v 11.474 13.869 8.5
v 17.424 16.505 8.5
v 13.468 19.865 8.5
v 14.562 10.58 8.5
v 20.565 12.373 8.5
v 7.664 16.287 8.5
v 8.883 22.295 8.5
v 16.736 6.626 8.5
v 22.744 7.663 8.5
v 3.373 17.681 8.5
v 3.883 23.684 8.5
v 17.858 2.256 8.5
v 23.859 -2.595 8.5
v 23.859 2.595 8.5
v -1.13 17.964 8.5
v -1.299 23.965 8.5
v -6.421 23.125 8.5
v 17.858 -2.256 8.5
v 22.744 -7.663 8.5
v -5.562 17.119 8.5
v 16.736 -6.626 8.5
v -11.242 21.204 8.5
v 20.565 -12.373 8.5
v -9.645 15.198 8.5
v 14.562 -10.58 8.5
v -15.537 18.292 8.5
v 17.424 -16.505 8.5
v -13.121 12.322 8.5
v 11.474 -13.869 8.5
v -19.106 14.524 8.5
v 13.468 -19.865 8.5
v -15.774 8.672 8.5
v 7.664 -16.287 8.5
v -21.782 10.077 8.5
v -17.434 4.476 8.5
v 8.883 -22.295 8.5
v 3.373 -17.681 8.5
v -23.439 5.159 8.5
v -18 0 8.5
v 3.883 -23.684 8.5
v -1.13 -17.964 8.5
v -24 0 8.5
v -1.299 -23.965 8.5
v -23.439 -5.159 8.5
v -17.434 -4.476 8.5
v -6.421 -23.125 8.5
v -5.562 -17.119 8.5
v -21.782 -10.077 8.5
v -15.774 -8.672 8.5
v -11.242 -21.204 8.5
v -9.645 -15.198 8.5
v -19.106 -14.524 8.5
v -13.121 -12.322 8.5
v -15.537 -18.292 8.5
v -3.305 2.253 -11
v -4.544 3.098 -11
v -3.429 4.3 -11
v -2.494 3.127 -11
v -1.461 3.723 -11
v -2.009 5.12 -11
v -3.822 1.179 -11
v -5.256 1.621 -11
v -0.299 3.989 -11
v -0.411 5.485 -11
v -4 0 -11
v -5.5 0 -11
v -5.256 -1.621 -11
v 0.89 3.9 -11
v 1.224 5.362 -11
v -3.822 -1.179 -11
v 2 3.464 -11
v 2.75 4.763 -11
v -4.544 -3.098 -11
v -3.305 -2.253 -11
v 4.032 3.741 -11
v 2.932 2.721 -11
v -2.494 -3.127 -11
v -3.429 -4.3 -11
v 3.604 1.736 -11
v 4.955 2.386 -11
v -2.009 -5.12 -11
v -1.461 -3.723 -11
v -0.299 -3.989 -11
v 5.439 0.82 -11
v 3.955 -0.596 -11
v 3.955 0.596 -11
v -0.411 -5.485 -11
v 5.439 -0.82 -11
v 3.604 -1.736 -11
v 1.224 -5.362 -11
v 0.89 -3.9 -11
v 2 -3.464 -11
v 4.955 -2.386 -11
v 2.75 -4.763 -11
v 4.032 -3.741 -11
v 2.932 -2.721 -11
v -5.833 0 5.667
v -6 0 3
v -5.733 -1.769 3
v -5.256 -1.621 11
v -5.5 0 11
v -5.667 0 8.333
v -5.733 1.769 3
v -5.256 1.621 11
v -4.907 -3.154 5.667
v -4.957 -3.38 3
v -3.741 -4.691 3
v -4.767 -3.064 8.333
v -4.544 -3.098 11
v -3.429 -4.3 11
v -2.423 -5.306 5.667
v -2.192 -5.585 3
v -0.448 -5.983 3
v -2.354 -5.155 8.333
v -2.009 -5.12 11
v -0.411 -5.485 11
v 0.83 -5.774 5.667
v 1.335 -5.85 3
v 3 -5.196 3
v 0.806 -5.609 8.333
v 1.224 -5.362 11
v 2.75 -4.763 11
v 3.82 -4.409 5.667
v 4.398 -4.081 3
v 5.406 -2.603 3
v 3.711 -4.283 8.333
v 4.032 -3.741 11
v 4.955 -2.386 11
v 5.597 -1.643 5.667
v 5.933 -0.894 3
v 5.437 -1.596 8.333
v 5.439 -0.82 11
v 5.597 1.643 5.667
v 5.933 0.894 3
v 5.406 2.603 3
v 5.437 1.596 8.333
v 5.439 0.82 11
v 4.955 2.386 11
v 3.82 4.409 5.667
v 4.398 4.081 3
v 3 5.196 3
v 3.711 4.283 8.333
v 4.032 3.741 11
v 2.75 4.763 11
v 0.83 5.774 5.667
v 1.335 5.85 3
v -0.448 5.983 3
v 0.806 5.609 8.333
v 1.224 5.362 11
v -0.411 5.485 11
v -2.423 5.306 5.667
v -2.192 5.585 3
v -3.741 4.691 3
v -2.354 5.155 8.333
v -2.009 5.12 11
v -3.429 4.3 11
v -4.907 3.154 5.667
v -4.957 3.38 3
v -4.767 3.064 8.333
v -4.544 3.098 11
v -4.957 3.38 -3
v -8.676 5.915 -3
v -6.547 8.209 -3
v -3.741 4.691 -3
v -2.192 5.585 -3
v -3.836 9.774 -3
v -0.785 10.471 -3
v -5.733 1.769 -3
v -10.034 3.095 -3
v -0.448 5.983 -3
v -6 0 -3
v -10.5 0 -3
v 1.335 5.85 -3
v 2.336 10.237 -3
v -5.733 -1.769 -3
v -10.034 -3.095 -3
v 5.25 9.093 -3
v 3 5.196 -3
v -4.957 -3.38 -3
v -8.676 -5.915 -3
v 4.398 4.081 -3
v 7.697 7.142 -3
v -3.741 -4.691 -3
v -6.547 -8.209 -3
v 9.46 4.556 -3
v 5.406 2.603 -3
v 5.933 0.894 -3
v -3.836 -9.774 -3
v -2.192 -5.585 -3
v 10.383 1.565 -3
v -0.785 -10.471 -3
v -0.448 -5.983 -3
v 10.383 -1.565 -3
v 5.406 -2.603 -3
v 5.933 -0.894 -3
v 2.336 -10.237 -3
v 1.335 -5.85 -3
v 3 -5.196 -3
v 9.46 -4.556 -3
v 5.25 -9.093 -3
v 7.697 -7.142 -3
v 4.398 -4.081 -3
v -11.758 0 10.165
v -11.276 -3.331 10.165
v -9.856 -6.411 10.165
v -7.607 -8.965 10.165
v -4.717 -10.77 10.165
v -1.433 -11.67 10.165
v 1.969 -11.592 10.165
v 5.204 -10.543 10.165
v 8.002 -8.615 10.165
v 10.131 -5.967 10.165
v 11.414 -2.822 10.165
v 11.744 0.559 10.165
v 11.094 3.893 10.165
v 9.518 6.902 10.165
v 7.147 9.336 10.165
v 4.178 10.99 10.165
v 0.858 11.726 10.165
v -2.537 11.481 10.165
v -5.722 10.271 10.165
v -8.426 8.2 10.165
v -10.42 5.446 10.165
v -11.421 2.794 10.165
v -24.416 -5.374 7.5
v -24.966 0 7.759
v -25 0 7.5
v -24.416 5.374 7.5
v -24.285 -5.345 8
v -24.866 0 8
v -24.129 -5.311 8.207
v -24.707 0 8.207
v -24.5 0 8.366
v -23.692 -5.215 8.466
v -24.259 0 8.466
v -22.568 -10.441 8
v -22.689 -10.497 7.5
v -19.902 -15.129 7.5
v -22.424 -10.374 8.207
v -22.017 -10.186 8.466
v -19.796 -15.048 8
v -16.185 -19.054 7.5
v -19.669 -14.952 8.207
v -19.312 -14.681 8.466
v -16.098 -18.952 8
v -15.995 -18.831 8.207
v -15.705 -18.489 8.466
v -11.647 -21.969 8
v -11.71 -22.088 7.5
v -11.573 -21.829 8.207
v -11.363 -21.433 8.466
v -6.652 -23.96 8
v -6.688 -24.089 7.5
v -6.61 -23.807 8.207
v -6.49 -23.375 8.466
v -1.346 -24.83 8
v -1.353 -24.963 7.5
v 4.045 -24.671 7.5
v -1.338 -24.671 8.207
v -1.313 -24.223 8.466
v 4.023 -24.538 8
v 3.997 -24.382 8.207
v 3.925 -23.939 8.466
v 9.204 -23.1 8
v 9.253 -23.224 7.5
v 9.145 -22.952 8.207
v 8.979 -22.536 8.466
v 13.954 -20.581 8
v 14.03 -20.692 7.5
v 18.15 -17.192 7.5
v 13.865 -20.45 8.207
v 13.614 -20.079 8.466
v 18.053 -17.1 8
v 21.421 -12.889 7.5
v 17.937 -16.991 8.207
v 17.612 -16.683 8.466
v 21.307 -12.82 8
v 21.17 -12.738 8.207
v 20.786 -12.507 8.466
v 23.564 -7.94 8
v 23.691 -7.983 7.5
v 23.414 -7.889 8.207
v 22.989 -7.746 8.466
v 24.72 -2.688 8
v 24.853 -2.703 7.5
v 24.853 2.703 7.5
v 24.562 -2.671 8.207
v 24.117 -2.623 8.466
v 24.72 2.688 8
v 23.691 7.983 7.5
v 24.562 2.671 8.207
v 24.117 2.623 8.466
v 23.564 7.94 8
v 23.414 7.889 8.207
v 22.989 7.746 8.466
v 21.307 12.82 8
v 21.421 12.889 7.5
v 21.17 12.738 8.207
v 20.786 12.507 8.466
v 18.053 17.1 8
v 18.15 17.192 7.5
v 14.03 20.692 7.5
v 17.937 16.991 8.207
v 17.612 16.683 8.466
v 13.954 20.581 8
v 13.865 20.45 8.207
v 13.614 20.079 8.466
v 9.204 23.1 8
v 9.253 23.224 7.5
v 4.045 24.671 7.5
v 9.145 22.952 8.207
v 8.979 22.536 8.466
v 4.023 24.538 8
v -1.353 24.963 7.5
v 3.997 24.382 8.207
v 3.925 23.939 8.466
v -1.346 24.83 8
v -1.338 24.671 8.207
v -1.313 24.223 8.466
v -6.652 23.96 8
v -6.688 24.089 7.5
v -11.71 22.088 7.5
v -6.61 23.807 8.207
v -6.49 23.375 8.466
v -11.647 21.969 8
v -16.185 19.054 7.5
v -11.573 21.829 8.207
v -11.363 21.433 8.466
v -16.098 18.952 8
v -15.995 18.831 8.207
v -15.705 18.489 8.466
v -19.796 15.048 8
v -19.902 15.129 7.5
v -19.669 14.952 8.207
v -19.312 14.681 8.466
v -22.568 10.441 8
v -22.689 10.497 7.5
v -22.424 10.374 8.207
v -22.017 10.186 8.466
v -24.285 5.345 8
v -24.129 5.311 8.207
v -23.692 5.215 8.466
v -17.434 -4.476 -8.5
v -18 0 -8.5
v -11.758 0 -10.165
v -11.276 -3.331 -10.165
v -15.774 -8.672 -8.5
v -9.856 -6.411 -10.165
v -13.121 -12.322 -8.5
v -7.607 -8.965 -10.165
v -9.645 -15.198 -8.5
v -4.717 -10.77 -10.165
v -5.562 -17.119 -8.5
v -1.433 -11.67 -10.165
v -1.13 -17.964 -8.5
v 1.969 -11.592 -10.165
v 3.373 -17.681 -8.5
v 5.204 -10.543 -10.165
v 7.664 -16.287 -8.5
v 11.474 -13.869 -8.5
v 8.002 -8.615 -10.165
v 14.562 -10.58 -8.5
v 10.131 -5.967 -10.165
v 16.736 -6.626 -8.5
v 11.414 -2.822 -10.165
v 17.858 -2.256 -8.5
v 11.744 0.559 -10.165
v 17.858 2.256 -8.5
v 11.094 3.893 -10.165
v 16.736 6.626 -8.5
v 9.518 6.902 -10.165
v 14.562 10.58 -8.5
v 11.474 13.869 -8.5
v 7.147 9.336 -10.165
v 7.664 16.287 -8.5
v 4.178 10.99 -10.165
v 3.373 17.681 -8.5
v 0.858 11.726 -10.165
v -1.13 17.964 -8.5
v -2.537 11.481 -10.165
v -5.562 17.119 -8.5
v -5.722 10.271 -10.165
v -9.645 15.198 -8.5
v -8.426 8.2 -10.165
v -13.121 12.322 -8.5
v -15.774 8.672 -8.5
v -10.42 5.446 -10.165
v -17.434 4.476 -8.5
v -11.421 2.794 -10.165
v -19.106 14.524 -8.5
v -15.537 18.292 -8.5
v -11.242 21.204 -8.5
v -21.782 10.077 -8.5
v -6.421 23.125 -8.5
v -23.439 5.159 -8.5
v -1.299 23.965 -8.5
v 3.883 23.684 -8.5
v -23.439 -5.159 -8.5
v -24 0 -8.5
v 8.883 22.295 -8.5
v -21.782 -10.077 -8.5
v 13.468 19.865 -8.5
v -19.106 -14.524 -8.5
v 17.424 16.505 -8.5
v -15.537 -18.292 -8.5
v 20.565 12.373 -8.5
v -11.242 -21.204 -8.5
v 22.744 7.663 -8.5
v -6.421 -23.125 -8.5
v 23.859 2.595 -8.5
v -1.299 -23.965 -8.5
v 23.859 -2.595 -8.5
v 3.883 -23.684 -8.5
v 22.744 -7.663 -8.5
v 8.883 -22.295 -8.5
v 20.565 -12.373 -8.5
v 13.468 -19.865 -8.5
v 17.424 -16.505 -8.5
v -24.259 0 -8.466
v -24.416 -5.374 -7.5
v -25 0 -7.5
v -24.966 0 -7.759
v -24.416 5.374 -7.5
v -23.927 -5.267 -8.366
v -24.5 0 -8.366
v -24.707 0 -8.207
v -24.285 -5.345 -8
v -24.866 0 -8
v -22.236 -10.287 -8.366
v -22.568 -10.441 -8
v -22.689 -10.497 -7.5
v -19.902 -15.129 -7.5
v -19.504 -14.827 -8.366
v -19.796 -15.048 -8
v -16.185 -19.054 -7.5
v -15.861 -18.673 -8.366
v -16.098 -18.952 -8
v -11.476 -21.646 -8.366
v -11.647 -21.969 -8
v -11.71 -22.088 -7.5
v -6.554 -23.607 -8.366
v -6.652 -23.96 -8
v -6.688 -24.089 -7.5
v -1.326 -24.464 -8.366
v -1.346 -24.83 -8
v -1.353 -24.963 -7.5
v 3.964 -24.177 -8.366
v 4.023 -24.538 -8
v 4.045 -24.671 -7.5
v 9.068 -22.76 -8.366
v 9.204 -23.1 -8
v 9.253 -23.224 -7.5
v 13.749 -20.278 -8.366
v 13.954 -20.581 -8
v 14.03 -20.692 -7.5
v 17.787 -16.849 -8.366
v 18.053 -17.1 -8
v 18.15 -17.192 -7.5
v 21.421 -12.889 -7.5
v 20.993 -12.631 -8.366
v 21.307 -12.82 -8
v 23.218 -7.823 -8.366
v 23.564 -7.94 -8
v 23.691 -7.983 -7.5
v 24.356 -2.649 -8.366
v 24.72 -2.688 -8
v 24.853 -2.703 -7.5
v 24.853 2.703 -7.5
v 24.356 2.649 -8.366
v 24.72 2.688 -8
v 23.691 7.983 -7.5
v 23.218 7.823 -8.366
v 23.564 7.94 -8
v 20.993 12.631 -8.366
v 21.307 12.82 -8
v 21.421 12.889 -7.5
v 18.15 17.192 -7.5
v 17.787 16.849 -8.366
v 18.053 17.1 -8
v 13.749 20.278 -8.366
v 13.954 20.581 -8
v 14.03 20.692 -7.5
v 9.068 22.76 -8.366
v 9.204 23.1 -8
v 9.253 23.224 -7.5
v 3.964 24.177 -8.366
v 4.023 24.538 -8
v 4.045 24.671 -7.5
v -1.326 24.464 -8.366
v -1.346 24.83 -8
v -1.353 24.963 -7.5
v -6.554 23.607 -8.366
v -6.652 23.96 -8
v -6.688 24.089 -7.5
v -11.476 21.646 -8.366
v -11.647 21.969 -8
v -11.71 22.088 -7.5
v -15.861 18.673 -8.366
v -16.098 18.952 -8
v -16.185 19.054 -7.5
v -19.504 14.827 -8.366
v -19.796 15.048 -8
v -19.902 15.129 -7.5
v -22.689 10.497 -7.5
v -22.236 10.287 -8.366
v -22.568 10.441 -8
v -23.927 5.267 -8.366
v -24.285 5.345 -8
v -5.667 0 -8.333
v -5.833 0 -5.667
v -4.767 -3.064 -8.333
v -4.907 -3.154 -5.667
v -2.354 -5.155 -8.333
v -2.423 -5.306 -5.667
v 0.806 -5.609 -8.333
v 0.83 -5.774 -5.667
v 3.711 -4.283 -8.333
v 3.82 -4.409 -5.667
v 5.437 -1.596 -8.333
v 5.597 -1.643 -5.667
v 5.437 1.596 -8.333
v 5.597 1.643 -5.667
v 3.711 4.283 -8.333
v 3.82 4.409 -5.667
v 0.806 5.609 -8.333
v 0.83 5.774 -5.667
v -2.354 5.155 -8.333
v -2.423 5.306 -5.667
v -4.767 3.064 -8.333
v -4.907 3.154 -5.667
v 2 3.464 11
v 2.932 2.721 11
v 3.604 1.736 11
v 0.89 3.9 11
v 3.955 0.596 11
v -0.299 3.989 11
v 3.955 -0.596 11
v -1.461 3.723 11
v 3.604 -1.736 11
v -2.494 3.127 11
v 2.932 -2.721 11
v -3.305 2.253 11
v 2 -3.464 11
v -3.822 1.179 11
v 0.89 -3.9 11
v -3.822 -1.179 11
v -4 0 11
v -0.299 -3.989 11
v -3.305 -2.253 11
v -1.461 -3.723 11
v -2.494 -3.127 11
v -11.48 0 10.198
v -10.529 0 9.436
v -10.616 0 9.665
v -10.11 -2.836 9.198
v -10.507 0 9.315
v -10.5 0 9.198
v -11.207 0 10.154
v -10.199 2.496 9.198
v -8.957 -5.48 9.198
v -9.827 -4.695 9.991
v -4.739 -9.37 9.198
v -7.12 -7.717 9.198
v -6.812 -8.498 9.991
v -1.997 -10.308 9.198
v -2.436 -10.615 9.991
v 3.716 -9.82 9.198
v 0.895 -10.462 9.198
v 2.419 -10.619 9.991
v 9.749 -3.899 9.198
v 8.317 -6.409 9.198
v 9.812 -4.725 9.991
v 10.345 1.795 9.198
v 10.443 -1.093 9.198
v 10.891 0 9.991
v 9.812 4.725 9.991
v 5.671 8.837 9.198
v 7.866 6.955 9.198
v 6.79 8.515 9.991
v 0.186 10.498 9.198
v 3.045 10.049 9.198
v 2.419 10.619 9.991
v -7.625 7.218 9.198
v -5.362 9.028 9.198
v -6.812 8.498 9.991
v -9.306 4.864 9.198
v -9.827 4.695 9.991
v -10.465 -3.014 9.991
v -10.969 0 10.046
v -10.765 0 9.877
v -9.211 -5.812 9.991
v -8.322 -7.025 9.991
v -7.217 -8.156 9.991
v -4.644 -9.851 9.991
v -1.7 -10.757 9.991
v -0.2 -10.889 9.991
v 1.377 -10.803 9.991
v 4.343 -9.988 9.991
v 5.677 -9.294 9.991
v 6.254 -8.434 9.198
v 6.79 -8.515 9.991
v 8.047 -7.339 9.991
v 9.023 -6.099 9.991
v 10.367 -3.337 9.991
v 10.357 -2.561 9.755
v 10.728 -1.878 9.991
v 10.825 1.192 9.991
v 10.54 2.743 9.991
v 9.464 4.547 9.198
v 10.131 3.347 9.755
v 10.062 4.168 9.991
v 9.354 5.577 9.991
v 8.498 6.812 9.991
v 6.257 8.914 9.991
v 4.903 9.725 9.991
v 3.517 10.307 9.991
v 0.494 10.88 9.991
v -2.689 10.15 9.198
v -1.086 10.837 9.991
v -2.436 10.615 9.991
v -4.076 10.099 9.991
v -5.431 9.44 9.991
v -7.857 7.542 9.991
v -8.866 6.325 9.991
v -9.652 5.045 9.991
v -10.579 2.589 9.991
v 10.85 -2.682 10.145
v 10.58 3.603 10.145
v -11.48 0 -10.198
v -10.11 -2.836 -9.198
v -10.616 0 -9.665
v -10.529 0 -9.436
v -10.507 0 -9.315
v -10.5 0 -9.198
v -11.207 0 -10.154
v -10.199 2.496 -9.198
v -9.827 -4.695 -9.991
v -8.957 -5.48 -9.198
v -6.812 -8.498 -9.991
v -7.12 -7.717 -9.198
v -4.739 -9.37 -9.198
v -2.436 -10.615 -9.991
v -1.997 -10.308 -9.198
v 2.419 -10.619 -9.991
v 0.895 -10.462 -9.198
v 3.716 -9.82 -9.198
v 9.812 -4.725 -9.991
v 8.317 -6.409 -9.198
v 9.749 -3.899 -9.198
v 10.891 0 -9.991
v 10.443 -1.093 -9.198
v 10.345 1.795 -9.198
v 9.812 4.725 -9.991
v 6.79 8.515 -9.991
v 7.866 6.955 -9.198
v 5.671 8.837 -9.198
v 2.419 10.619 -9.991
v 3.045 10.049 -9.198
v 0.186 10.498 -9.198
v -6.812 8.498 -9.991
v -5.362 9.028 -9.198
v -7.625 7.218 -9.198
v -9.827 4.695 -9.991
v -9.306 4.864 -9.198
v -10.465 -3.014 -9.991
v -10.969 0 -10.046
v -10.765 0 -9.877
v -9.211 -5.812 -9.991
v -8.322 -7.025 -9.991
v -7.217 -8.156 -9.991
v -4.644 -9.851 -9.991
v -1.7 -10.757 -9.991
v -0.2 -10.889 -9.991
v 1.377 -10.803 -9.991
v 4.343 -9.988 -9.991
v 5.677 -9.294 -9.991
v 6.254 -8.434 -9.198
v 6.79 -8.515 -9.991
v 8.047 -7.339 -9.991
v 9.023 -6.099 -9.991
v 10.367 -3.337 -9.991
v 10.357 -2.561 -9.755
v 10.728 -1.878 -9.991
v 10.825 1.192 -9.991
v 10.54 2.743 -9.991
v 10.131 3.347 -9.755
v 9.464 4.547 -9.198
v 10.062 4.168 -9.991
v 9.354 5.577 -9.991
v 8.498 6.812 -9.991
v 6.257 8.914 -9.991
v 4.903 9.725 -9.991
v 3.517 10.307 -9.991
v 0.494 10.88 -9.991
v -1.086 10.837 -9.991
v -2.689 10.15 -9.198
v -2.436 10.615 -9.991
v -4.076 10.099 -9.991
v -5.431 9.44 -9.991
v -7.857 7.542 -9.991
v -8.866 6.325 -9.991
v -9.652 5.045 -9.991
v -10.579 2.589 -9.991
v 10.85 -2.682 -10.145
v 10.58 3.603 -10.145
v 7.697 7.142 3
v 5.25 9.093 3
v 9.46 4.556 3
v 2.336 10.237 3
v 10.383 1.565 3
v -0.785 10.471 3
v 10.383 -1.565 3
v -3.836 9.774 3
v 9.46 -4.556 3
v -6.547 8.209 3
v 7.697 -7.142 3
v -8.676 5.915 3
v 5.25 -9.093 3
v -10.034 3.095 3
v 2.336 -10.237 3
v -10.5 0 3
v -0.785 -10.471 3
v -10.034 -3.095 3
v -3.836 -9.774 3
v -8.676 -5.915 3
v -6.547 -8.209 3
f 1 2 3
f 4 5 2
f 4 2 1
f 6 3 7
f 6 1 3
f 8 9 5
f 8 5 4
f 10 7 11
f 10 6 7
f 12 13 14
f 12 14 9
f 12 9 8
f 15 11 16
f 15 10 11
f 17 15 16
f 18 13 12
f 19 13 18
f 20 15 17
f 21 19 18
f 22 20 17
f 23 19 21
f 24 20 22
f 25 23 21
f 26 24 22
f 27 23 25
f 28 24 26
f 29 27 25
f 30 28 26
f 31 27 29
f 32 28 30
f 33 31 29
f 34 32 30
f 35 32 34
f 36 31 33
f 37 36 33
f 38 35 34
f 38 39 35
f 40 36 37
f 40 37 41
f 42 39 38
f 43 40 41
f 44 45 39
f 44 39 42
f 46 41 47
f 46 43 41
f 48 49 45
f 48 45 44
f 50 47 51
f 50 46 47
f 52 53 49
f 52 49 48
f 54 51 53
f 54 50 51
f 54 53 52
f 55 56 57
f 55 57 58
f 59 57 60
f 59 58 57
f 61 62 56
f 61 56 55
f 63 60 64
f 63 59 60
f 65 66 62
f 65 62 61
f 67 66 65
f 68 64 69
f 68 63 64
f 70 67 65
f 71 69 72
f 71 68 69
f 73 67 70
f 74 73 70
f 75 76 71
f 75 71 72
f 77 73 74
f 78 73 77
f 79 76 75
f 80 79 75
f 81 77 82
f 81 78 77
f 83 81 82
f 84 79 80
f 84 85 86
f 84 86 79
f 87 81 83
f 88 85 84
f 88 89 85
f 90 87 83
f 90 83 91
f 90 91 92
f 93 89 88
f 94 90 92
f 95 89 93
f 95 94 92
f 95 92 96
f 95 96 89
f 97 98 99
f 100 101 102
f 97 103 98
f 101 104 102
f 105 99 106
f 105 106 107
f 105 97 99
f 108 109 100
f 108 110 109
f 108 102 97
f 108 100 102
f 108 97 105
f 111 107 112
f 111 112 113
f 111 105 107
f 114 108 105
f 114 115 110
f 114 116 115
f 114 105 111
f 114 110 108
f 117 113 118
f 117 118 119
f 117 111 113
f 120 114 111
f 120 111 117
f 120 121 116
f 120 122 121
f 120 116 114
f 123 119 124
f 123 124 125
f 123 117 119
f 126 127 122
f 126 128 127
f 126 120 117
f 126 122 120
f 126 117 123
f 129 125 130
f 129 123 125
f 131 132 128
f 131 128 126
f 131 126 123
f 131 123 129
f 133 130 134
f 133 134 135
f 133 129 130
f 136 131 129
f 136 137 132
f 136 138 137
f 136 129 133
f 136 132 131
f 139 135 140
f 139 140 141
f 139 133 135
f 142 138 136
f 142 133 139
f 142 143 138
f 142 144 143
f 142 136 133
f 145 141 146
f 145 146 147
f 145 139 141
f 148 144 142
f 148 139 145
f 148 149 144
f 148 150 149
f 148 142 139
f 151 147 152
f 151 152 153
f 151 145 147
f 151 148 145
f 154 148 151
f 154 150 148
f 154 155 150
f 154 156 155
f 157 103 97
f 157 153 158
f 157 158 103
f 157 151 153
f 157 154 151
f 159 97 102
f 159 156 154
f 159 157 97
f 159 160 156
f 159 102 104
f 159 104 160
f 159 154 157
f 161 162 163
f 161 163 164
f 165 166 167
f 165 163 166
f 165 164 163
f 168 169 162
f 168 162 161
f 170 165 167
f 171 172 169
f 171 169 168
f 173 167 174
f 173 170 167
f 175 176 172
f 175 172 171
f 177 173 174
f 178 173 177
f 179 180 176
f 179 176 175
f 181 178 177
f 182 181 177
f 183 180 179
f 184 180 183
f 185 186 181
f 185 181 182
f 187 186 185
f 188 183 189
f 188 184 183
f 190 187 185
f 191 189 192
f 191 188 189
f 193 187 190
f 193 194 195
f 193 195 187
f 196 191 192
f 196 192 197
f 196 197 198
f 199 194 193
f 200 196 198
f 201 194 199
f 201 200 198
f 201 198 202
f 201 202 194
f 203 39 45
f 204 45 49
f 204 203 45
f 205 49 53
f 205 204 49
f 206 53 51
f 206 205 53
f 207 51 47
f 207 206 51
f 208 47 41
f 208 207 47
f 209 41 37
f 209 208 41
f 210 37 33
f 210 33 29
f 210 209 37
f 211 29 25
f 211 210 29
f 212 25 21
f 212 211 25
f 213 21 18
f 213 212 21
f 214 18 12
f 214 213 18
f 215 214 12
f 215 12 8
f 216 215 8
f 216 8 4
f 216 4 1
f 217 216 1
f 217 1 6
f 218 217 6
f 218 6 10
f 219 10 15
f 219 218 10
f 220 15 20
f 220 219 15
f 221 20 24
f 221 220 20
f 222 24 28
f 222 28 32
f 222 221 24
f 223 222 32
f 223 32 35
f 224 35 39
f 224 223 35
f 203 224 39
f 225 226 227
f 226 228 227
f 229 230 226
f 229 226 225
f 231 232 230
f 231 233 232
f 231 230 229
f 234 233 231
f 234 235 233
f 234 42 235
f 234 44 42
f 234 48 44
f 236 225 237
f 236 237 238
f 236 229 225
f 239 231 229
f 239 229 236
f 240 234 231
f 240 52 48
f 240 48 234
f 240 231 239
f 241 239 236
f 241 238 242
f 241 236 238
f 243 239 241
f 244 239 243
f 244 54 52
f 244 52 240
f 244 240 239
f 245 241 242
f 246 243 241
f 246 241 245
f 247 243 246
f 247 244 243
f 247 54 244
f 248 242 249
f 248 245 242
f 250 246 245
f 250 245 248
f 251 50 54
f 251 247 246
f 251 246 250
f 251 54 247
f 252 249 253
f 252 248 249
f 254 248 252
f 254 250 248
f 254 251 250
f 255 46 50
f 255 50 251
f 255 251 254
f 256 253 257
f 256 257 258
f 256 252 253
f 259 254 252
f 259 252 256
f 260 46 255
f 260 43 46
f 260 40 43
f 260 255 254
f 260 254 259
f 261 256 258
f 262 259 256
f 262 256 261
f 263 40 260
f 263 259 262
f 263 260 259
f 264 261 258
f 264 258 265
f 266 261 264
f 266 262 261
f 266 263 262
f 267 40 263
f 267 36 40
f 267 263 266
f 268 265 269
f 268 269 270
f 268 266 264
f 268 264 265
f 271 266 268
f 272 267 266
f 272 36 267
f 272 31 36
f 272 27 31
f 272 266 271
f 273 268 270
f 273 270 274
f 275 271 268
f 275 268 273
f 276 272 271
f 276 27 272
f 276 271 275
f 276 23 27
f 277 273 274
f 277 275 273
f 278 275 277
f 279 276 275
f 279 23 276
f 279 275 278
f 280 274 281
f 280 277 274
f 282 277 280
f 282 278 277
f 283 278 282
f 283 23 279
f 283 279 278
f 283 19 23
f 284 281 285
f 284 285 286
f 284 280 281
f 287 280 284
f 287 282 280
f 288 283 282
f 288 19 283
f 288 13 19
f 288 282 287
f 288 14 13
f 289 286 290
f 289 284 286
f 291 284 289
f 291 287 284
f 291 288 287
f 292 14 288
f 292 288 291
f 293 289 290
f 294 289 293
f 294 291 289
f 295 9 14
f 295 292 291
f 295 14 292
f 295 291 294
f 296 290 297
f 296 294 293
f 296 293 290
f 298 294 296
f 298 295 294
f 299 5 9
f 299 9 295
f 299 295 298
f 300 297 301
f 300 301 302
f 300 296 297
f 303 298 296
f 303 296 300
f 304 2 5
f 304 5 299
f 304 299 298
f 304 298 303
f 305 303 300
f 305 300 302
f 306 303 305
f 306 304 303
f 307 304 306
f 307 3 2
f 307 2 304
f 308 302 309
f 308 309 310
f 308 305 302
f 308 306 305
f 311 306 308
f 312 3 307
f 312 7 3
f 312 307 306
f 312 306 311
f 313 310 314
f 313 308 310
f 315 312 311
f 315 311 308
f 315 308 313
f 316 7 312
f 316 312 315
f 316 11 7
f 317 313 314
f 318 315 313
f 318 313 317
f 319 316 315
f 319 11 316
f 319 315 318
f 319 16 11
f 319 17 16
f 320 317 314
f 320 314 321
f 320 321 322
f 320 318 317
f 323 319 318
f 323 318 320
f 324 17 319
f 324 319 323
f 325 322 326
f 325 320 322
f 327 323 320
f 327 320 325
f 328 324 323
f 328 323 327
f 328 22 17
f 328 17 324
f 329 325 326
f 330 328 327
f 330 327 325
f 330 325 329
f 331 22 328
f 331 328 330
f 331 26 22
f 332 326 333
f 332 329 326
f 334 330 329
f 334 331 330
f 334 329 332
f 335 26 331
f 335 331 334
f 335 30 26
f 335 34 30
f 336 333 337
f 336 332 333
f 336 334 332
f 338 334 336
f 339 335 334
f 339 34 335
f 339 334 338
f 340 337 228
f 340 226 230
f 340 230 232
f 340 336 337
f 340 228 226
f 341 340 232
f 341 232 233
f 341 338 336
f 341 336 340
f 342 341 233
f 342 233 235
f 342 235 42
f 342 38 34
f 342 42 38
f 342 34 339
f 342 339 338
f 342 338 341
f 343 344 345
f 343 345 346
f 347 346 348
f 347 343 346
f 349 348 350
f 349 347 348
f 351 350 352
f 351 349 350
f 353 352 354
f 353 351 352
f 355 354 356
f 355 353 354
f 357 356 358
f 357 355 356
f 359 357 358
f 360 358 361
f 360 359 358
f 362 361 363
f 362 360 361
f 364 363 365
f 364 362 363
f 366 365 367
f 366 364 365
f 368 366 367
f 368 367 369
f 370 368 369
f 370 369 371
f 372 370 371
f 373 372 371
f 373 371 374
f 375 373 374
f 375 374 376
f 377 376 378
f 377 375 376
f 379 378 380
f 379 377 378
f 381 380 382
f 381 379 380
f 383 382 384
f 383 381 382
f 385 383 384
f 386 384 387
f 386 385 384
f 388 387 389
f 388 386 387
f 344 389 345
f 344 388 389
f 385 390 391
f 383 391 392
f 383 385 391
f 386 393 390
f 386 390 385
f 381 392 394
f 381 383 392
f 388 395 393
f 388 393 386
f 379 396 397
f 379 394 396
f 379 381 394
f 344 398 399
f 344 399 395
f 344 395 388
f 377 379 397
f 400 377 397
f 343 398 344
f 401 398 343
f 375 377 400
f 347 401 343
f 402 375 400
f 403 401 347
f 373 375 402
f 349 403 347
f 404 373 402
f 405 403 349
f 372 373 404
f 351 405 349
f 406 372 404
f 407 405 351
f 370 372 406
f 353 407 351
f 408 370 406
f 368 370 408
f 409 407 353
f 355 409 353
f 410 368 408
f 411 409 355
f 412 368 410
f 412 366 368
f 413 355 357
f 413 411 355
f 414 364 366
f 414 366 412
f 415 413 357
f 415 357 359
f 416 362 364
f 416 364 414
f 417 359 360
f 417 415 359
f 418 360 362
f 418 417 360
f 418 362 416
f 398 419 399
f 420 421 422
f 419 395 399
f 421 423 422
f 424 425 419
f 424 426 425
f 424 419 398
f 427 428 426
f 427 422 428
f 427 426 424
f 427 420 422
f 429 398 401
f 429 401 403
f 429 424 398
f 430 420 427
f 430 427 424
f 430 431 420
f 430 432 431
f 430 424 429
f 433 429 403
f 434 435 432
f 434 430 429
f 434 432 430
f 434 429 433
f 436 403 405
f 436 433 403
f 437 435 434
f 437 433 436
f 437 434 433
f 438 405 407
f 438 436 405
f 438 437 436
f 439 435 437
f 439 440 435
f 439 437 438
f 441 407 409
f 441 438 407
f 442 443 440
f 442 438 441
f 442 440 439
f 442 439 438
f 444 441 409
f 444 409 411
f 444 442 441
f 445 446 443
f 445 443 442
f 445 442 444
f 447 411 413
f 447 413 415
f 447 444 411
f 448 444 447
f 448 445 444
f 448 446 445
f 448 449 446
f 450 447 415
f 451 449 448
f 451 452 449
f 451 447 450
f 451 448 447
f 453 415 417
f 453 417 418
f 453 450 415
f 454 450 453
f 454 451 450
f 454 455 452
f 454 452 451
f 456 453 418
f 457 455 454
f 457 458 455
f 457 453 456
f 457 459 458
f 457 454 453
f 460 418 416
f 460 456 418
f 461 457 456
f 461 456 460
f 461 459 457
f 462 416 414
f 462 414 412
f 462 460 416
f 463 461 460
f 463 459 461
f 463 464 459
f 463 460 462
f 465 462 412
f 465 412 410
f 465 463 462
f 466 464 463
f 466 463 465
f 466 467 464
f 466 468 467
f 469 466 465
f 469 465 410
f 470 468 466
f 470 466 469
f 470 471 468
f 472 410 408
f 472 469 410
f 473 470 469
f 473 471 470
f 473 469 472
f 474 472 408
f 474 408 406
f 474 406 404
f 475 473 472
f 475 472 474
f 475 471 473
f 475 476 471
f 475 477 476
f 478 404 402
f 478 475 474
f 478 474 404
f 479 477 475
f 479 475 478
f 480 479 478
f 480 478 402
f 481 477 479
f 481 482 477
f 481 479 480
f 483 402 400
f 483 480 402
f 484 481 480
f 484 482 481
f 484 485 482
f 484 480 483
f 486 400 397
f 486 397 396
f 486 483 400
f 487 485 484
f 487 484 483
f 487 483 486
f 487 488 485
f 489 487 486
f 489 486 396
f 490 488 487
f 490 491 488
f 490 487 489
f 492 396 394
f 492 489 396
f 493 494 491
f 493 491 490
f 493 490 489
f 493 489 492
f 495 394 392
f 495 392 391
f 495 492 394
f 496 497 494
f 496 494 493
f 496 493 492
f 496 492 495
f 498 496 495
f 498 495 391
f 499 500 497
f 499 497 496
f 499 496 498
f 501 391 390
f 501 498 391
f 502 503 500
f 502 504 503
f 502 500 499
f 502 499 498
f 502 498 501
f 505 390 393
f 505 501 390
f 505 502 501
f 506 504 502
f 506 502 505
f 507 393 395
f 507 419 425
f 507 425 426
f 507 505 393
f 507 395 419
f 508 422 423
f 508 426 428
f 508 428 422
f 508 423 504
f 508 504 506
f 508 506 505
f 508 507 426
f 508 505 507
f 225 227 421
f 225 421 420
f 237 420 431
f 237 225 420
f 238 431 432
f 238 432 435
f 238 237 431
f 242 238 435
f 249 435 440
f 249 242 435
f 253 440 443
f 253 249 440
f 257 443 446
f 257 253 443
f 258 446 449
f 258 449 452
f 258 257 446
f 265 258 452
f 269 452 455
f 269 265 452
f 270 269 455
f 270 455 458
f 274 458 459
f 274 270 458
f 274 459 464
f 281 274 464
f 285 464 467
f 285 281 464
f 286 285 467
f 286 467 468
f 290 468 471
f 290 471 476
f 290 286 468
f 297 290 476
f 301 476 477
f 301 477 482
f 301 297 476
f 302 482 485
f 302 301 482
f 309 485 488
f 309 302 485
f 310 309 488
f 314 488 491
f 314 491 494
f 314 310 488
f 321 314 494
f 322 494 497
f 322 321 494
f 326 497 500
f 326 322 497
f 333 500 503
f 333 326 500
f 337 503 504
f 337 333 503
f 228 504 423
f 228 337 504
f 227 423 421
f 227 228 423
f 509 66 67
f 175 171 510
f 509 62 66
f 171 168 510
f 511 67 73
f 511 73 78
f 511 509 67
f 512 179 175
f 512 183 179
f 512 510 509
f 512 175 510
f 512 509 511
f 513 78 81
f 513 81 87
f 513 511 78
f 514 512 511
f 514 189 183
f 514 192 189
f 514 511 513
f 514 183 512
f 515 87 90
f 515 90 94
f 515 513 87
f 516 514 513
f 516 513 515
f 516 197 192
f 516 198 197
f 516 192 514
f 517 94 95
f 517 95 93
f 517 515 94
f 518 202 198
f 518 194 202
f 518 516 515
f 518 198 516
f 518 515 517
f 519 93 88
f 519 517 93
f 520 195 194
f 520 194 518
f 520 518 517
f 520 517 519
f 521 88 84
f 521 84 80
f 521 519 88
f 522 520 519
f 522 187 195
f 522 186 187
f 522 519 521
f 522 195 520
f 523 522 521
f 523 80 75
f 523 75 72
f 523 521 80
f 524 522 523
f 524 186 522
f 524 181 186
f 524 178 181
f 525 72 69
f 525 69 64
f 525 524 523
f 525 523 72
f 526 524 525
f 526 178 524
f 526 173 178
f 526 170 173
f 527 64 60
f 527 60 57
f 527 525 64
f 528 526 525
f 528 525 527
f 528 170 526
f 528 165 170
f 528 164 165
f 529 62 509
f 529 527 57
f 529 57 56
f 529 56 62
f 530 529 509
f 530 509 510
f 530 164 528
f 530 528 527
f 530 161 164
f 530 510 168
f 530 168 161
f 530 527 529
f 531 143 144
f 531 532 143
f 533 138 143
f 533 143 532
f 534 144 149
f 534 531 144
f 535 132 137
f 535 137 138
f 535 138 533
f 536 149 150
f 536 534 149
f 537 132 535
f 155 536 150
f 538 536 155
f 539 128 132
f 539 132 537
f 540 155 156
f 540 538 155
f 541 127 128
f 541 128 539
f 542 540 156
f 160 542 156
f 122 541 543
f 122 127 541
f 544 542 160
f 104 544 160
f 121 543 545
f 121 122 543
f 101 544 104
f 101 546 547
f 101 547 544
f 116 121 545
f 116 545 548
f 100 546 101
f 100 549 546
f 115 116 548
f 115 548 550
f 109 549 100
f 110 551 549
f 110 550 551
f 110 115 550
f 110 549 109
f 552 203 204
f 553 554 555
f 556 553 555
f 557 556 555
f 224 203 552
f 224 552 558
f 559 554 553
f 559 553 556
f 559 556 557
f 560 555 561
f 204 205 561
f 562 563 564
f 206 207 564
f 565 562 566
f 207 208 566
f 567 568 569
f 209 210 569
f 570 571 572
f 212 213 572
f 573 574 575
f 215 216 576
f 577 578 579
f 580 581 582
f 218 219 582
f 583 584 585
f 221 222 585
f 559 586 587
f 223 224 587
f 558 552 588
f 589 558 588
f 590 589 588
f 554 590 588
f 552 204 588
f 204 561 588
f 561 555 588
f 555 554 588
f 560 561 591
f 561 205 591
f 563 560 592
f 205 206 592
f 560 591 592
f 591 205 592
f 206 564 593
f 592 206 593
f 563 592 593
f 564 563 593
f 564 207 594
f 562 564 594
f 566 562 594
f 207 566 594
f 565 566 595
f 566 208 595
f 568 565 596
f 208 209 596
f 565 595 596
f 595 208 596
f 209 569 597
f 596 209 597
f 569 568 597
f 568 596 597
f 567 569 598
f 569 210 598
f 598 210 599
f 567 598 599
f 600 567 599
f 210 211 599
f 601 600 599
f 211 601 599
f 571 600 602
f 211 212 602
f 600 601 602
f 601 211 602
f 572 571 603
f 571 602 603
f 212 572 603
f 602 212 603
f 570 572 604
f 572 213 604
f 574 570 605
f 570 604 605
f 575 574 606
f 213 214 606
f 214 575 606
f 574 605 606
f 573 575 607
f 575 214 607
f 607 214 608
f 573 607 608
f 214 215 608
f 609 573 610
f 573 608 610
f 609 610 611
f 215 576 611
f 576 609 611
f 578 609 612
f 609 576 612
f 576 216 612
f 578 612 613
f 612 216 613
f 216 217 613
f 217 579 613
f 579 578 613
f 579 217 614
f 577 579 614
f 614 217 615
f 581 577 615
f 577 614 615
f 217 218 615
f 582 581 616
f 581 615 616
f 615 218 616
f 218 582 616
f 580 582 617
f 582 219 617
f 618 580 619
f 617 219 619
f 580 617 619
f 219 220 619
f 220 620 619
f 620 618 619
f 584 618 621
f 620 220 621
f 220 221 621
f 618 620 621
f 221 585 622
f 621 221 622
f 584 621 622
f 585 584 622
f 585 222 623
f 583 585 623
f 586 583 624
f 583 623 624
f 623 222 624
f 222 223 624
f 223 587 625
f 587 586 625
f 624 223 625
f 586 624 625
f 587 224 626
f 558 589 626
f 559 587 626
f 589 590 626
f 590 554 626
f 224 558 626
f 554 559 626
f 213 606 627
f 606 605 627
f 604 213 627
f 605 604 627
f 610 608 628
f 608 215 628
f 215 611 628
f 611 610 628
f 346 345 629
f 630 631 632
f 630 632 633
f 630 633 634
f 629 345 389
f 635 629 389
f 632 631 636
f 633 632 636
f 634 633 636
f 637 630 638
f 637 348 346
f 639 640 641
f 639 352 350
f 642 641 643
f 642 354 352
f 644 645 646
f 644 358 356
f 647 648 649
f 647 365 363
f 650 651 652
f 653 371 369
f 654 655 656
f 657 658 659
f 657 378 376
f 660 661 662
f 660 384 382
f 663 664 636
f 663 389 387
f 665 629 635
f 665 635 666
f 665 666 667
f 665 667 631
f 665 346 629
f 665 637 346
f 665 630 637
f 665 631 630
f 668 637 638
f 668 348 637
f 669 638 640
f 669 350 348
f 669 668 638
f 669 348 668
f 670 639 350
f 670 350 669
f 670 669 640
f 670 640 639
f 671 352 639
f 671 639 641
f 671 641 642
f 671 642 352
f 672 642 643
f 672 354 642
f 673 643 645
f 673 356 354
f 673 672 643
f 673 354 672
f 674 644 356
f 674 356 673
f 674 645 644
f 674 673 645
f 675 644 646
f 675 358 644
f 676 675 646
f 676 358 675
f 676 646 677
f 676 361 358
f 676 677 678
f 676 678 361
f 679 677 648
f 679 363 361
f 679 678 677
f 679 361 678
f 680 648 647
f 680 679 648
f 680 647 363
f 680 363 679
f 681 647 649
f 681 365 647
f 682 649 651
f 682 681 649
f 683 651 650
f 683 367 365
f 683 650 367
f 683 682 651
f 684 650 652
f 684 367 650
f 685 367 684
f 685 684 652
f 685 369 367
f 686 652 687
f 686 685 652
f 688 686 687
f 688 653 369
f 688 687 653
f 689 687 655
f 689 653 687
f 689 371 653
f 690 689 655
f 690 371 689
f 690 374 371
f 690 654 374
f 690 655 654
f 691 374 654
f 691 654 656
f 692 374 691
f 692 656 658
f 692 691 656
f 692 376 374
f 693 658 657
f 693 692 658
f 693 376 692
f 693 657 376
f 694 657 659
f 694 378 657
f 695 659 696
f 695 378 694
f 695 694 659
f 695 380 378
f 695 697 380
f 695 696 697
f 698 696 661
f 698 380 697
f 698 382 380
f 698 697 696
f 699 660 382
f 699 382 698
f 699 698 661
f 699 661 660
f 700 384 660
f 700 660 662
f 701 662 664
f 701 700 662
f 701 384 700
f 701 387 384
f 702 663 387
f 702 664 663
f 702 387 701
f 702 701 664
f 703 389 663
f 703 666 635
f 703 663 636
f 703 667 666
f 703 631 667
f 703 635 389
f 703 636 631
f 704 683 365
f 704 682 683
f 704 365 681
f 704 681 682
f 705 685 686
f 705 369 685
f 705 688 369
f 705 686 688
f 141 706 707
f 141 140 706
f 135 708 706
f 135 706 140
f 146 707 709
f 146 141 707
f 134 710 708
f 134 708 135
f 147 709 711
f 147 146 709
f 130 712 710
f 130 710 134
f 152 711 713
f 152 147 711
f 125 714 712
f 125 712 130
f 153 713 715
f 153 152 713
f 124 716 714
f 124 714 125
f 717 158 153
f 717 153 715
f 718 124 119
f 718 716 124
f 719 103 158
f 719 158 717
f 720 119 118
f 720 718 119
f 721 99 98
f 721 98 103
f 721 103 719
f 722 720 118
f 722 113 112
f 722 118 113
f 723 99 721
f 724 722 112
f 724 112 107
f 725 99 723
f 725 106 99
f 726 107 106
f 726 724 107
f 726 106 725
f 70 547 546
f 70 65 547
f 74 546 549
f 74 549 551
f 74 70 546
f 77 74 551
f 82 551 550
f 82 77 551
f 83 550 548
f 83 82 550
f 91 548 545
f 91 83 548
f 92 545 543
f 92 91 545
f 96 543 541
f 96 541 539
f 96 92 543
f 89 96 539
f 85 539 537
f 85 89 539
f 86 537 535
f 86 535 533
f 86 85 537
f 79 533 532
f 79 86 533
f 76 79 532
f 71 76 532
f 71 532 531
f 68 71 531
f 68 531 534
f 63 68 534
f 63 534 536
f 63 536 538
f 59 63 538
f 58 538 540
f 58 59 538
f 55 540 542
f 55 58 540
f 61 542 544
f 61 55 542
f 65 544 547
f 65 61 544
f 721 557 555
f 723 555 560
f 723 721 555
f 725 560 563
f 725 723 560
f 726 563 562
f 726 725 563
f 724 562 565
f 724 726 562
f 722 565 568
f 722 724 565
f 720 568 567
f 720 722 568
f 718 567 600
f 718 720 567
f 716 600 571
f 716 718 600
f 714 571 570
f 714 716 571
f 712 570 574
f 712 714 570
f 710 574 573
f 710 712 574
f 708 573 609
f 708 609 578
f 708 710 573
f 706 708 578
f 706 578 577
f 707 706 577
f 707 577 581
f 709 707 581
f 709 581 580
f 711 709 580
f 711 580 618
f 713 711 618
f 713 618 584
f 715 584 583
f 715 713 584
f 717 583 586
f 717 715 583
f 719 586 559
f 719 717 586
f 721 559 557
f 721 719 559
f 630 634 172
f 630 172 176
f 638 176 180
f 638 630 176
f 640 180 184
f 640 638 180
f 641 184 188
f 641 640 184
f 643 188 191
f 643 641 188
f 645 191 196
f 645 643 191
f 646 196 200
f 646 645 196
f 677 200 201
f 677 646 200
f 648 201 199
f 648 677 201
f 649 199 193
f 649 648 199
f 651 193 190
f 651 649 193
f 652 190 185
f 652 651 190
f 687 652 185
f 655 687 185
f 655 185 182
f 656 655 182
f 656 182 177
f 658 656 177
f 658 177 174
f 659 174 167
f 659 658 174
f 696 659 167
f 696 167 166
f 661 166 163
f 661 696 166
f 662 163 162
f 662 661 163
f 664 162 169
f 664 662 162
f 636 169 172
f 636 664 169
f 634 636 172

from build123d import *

# Parameters (mm, degrees)
CONG_1_R = 1
CONG_2_R = 1


with BuildPart() as part:
    # Esquisse1 → Révolution1 (revolve)
    with BuildSketch(Plane(origin=(0, 0, 0), x_dir=(1, 0, 0), z_dir=(0, 1, 0)), mode=Mode.PRIVATE) as r_volution1_sk:
        Polygon((4, -11), (4, 11), (5.5, 11), (6, 3), (10.5, 3), (10.5, 10.5), (18, 8.5), (25, 8.5), (25, -8.5), (18, -8.5), (10.5, -10.5), (10.5, -3), (6, -3), (5.5, -11), align=None)
    revolve(r_volution1_sk.sketch.rotate(Axis((0, 0, -12.605103239), (0, 0, 1)), 180), axis=Axis((0, 0, -12.605103239), (0, 0, 1)))

    # Congé1
    cong_1_edges = [part.edges().sort_by_distance(p)[0] for p in [
        (25, 0, -8.5),
        (25, 0, 8.5),
    ]]
    fillet(cong_1_edges, radius=CONG_1_R)

    # Congé2
    cong_2_edges = [part.edges().sort_by_distance(p)[0] for p in [
        (10.5, 0, -10.5),
        (10.5, 0, 10.5),
    ]]
    fillet(cong_2_edges, radius=CONG_2_R)


solid = part.part
